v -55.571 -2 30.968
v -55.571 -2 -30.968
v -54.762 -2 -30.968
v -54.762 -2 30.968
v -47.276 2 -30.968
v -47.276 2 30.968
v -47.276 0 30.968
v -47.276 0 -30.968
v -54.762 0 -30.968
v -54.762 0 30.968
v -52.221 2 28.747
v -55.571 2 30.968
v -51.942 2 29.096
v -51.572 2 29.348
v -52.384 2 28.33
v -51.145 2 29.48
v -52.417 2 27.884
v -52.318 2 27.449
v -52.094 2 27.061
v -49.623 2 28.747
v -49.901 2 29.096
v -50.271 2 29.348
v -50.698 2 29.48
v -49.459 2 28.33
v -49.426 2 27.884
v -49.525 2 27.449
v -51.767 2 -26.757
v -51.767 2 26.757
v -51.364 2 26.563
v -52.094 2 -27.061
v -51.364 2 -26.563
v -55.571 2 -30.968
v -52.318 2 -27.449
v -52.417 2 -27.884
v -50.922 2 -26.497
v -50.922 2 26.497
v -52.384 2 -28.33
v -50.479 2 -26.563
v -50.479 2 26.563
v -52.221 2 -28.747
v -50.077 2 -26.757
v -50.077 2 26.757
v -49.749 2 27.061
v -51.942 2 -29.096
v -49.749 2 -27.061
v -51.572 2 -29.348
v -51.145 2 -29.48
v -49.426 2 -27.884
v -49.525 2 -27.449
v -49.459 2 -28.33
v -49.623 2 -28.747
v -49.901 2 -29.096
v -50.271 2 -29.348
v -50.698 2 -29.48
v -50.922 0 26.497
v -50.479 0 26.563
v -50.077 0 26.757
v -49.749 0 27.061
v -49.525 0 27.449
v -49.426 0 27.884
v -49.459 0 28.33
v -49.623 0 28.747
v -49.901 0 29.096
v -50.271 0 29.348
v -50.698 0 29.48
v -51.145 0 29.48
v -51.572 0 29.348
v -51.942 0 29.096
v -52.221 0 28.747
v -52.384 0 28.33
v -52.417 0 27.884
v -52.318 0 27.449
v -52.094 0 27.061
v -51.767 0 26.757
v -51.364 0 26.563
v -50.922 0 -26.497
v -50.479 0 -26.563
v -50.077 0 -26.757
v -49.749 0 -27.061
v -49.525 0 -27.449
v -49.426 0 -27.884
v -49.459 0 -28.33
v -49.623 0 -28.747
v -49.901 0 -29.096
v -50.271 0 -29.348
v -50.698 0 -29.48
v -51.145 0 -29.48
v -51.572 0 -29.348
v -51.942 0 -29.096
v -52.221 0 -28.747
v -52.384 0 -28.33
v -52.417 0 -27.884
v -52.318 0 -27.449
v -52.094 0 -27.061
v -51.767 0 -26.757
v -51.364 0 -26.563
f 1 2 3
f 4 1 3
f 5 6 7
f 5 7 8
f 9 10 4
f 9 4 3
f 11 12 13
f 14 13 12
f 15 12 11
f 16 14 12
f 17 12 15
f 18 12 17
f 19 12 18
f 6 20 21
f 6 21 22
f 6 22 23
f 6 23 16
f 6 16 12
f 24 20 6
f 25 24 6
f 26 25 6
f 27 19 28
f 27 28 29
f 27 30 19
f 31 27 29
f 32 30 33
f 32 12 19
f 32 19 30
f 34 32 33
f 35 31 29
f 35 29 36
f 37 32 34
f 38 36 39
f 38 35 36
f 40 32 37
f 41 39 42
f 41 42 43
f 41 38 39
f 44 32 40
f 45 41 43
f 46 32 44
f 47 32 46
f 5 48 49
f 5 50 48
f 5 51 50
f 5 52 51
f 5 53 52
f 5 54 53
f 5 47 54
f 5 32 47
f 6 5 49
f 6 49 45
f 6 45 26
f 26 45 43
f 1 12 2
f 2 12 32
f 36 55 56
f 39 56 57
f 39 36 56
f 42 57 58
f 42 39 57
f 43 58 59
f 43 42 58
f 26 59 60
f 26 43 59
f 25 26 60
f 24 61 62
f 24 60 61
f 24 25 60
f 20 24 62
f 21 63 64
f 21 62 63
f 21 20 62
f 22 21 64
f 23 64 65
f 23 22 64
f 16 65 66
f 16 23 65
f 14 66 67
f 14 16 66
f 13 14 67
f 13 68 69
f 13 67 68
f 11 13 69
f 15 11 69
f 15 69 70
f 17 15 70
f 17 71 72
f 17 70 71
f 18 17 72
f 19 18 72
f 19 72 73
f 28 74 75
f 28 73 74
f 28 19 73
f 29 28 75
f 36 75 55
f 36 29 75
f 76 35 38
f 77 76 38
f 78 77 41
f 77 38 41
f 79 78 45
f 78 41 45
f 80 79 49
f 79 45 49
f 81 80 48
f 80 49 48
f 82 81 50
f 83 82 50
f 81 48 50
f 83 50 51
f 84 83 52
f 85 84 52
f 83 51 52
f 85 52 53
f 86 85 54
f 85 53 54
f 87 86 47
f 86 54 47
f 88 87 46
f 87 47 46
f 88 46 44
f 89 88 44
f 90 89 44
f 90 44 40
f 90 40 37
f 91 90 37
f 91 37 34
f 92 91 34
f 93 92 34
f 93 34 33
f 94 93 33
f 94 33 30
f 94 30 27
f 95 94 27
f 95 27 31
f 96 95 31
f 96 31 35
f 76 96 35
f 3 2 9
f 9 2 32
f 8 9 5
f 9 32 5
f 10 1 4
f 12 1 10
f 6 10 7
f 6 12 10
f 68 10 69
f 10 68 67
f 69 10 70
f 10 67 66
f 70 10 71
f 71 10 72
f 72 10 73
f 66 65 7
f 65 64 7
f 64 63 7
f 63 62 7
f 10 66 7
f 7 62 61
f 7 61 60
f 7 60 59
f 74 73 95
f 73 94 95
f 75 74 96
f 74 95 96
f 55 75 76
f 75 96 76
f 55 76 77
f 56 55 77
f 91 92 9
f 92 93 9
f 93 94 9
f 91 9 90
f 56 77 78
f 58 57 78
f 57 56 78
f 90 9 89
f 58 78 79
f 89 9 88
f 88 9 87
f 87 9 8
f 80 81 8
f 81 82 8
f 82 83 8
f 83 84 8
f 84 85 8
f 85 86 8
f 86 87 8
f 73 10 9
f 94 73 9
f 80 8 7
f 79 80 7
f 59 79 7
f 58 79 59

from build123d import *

# Parameters (mm, degrees)
SKETCH1_W               = 108.761980125
SKETCH1_H               = 61.936744186
BOSS_EXTRUDE1_DEPTH     = 2
SKETCH2_R               = 1.5
CUT_EXTRUDE1_DEPTH      = 63.943741049
MIRROR2_COPY_1_SKETCH_R = 1.5
MIRROR2_COPY_1_DEPTH    = 63.943741049
SKETCH3_W               = 94.024869854
SKETCH3_H               = 56.555498618
CUT_EXTRUDE2_DEPTH      = 63.943741049
SKETCH6_W               = 101.2762547
SKETCH6_H               = 61.936744186
CUT_EXTRUDE5_DEPTH      = 10
SKETCH8_W               = 0.808555921
SKETCH8_H               = 61.936744186
BOSS_EXTRUDE2_DEPTH     = 4


with BuildPart() as part:
    # Sketch1 → Boss-Extrude1 (new body)
    with BuildSketch(Plane(origin=(0, 0, 0), x_dir=(1, 0, 0), z_dir=(0, 1, 0))):
        with Locations((-0.380990063, 0)):
            Rectangle(SKETCH1_W, SKETCH1_H)
    extrude(amount=BOSS_EXTRUDE1_DEPTH)

    # Sketch2 → Cut-Extrude1 (cut, through all)
    with BuildSketch(Plane(origin=(0, 2, 0), x_dir=(1, 0, 0), z_dir=(0, 1, 0))):
        with Locations(Location((-50.921572875, 27.996572875, 0), (0, 0, 270))):
            Circle(SKETCH2_R)
    cut_extrude1 = extrude(amount=-CUT_EXTRUDE1_DEPTH, mode=Mode.SUBTRACT)

    # Mirror1: Cut-Extrude1 across plane
    add(cut_extrude1.mirror(Plane.XY), mode=Mode.SUBTRACT)

    # Mirror2: Cut-Extrude1 across plane
    add(cut_extrude1.mirror(Plane.ZY.offset(0.380990062)), mode=Mode.SUBTRACT)

    # Mirror2 copy 1 sketch → Mirror2 copy 1 (cut, through all)
    with BuildSketch(Plane(origin=(-0.761980125, 2, 0), x_dir=(-1, 0, 0), z_dir=(0, 1, 0))):
        with Locations(Location((-50.921572875, 27.996572875, 0), (0, 0, 270))):
            Circle(MIRROR2_COPY_1_SKETCH_R)
    extrude(amount=-MIRROR2_COPY_1_DEPTH, mode=Mode.SUBTRACT)

    # Sketch3 → Cut-Extrude2 (cut, through all)
    with BuildSketch(Plane(origin=(0, 2, 0), x_dir=(1, 0, 0), z_dir=(0, 1, 0))):
        Rectangle(SKETCH3_W, SKETCH3_H)
    extrude(amount=-CUT_EXTRUDE2_DEPTH, mode=Mode.SUBTRACT)

    # Sketch6 → Cut-Extrude5 (cut)
    with BuildSketch(Plane(origin=(0, 2, 0), x_dir=(1, 0, 0), z_dir=(0, 1, 0))):
        with Locations((3.36187265, 0)):
            Rectangle(SKETCH6_W, SKETCH6_H)
    extrude(amount=-CUT_EXTRUDE5_DEPTH, mode=Mode.SUBTRACT)

    # Sketch8 → Boss-Extrude2 (add)
    with BuildSketch(Plane(origin=(0, 2, 0), x_dir=(1, 0, 0), z_dir=(0, 1, 0))):
        with Locations((-55.166258086, 0)):
            Rectangle(SKETCH8_W, SKETCH8_H)
    extrude(amount=-BOSS_EXTRUDE2_DEPTH)


solid = part.part
